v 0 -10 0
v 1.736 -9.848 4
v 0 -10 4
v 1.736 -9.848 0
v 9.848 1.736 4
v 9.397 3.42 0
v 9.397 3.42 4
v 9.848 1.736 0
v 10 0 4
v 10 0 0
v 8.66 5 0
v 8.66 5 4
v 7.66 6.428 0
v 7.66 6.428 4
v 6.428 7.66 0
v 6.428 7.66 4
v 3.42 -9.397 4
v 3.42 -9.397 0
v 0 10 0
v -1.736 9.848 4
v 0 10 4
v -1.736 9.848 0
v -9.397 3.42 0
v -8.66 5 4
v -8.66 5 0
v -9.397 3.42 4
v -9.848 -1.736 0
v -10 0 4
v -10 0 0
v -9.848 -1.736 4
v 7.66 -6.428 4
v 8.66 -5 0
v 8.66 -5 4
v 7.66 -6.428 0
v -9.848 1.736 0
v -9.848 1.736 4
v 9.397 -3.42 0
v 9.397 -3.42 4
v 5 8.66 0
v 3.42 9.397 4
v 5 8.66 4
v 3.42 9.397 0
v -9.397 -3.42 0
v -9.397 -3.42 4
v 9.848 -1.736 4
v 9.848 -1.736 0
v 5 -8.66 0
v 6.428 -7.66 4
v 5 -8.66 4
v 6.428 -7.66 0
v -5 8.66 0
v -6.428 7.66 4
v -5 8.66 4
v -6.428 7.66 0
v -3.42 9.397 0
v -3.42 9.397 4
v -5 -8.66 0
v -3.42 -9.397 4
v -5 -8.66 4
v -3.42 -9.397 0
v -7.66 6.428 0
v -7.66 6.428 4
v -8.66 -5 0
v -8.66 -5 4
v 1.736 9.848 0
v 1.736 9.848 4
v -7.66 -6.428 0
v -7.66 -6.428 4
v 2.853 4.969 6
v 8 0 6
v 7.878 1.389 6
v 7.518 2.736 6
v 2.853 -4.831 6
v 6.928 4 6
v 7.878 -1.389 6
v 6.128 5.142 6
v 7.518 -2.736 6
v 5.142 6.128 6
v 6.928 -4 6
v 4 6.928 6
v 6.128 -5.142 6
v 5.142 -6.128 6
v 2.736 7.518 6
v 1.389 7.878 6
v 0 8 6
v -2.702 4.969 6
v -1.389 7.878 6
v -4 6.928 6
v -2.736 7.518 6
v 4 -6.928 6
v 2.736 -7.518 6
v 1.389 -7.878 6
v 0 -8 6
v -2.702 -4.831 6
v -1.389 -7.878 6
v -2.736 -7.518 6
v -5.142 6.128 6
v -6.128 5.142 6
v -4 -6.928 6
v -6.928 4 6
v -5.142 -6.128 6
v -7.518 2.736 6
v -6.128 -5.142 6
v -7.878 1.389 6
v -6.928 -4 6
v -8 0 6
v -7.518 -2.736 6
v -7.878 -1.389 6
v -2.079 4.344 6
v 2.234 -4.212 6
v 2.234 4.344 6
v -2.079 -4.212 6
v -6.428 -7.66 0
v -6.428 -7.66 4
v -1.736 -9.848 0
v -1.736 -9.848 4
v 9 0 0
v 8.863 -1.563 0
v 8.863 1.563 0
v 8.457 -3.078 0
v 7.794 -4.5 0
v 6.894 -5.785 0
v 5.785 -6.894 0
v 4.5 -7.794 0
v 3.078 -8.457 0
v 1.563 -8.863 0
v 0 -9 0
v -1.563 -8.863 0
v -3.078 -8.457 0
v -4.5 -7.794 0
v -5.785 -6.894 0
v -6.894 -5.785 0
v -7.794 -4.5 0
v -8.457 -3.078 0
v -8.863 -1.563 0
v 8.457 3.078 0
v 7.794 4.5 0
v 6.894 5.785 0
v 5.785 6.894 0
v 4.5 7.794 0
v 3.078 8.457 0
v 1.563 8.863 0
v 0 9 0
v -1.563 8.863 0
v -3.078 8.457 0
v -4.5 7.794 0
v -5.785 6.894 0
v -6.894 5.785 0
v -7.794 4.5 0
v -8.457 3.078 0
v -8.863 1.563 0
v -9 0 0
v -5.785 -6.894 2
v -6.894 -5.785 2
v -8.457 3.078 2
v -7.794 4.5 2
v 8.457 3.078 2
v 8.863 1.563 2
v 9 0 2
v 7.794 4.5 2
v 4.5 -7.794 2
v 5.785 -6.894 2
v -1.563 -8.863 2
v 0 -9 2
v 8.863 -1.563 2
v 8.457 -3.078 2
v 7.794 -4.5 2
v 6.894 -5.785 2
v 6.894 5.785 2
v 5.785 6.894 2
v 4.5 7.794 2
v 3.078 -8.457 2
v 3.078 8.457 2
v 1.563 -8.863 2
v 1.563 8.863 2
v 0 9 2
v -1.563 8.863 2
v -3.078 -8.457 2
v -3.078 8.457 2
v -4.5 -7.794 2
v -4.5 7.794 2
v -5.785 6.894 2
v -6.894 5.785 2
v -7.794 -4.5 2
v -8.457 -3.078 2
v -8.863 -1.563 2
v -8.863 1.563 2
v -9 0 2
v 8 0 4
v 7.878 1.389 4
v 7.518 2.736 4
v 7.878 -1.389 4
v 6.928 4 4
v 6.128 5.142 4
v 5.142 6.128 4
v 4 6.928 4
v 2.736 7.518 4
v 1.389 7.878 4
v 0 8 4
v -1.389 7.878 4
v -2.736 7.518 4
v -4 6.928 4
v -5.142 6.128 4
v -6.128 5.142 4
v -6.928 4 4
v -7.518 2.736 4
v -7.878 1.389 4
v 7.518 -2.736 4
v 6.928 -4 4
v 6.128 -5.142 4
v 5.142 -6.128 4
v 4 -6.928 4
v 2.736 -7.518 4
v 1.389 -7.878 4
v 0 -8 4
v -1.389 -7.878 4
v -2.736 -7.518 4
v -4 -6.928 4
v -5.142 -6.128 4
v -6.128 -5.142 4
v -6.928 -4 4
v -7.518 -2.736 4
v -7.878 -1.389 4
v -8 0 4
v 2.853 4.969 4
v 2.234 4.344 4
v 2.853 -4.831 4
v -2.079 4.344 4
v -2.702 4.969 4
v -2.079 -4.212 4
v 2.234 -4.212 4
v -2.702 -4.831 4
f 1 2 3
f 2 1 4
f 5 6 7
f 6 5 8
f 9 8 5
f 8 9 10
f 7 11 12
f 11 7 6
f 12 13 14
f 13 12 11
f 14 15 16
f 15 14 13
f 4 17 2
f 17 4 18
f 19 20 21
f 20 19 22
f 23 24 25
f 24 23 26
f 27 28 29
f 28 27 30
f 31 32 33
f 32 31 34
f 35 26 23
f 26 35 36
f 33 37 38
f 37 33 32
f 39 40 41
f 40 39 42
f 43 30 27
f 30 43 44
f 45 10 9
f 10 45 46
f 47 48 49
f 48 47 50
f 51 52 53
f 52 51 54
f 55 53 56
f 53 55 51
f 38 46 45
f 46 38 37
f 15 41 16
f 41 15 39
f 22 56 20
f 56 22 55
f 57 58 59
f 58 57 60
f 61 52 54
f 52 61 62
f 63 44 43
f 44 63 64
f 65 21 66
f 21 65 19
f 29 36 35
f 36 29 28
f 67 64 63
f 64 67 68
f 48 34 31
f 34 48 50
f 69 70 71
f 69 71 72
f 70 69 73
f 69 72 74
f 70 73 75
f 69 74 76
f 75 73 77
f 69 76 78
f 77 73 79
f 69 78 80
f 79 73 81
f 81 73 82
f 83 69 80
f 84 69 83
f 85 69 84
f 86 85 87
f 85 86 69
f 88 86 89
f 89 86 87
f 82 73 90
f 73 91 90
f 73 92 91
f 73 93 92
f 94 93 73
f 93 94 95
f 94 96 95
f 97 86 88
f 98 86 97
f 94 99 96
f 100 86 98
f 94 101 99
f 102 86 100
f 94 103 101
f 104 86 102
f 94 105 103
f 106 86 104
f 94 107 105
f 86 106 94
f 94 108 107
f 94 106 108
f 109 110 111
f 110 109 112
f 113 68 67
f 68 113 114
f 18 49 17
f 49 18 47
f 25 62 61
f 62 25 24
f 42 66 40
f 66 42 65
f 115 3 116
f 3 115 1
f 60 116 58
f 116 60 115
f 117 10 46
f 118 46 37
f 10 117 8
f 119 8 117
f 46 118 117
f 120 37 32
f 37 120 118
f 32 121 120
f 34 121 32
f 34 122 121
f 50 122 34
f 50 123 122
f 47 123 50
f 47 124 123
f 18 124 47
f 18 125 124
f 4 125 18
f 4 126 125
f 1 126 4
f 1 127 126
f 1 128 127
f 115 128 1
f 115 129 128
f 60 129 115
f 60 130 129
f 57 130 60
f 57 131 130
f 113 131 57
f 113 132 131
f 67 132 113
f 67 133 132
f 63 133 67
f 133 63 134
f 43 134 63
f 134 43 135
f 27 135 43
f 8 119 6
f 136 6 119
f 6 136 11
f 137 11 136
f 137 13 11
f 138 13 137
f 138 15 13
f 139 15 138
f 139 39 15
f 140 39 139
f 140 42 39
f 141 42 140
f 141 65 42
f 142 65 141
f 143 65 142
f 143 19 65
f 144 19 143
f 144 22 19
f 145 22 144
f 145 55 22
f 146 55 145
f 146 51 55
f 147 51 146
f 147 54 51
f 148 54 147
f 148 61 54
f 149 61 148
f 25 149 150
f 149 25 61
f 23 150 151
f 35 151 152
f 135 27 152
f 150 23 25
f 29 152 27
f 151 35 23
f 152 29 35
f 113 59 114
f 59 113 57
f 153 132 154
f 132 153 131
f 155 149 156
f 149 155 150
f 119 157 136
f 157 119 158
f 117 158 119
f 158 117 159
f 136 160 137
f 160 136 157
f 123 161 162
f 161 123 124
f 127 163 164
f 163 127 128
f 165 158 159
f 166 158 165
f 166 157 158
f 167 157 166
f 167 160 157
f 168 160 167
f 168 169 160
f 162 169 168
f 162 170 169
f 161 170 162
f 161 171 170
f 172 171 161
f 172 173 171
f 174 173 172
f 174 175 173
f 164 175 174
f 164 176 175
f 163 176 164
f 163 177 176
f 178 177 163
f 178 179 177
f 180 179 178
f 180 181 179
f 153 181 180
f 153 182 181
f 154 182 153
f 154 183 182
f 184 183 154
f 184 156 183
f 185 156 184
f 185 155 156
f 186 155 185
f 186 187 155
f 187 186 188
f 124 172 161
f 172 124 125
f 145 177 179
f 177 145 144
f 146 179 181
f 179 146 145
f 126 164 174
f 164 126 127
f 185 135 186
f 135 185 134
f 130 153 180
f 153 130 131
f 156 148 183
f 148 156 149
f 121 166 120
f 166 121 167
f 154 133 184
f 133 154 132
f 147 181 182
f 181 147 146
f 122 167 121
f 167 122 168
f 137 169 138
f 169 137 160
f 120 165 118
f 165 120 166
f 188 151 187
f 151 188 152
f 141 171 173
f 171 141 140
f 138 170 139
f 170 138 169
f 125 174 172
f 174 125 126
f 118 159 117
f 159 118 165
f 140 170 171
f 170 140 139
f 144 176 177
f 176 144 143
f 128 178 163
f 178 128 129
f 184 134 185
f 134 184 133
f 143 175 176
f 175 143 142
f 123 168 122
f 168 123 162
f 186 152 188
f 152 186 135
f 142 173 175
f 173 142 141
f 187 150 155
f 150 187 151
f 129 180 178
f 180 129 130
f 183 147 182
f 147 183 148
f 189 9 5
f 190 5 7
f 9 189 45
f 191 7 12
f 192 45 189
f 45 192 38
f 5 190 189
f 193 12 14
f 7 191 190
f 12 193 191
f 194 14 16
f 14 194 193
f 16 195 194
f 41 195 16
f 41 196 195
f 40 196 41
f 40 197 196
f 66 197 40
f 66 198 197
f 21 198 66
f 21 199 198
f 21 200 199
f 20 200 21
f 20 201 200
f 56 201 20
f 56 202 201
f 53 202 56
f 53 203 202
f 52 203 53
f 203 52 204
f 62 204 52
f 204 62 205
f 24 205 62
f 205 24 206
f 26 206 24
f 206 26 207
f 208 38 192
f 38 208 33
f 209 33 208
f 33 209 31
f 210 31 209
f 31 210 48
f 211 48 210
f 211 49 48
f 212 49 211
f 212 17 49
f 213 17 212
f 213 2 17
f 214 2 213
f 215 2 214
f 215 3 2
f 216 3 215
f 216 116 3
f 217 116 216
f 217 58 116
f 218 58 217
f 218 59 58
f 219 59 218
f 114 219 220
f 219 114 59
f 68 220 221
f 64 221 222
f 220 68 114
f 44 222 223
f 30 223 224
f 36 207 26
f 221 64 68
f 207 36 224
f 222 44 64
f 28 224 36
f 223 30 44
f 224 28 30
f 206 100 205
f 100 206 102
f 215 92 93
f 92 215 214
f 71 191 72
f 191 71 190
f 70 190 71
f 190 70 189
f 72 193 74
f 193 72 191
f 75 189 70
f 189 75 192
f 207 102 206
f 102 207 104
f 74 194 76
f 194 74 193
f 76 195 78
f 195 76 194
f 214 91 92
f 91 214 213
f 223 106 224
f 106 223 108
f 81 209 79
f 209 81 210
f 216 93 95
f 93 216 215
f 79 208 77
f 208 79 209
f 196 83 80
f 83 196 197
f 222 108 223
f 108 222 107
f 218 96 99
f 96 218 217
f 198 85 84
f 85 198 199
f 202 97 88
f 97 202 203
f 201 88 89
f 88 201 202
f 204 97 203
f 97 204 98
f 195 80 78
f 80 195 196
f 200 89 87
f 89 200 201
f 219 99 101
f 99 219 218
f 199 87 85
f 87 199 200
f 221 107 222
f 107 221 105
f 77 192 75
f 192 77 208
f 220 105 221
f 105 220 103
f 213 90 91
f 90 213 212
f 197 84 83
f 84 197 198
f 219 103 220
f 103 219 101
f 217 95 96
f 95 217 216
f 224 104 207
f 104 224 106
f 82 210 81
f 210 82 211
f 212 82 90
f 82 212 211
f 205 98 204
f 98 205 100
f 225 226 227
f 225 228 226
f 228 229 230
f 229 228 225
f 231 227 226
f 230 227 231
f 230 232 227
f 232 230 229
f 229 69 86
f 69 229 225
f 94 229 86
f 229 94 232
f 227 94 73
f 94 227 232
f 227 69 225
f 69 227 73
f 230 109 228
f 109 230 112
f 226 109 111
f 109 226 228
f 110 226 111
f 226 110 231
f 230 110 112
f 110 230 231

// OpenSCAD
difference() {
	difference() {
		difference() {
			cylinder($fn = 36, h = 6, r = 10);
			translate(v = [0, 0, -1]) {
				cylinder($fn = 36, h = 3, r = 9);
			}
		}
		translate(v = [0, 0, 4]) {
			difference() {
				cylinder($fn = 36, h = 3, r = 10.5000000000);
				cylinder($fn = 36, h = 3, r = 8);
			}
		}
	}
	translate(v = [0, 0, 4]) {
		linear_extrude(height = 3) {
			text(font = "mana", halign = "center", size = 8, text = "\uE602", valign = "center");
		}
	}
}
